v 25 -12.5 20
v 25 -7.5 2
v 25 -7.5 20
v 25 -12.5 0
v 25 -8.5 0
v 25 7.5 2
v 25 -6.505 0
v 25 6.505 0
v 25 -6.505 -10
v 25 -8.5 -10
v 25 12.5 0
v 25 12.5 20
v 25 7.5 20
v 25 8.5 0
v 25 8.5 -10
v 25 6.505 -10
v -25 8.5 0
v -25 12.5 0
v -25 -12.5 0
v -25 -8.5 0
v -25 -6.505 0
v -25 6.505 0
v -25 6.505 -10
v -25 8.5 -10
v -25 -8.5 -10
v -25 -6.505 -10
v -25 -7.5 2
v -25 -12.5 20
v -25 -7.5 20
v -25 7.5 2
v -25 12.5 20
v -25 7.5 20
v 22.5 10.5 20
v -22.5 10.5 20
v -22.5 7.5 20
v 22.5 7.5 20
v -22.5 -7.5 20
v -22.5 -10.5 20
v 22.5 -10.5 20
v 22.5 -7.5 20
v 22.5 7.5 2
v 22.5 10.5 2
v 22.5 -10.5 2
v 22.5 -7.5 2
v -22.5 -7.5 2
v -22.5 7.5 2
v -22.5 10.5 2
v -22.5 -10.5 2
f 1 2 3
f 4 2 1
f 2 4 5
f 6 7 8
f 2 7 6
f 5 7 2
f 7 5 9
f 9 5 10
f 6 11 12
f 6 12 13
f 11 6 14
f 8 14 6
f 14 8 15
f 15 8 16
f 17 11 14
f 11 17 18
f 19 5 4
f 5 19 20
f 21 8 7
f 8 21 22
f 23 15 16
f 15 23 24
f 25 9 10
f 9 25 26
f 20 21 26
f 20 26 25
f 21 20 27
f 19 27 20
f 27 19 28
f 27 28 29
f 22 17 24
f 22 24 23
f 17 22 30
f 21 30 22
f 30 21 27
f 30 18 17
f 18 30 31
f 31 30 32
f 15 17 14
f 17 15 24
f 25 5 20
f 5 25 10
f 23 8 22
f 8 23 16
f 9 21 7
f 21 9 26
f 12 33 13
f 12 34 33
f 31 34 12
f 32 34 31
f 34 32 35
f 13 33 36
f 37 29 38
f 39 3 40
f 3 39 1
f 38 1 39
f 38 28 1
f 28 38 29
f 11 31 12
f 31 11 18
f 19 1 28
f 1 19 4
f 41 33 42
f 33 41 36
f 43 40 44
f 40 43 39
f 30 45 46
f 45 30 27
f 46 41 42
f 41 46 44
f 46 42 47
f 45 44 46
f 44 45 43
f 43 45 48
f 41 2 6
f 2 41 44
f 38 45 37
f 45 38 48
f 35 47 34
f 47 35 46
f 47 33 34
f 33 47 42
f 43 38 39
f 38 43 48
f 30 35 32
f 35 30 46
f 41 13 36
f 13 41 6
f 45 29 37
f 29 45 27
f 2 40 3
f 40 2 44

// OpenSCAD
holerad=2.5;
module pi(){
difference(){
translate([0,0,-5])cube([90,13+4,10],center=true);
translate([0,0,-5])cube([90.01,13.01,10],center=true);
}
difference(){
    translate([0,0,1])cube([90,60,2],center=true);
    translate([20-60,-24.5, 1])cylinder(4, r=holerad,center=true,$fn=50);
    translate([20-60, 24.5, 1])cylinder(4, r=holerad,center=true,$fn=50);
    translate([20-2,-24.5,  1])cylinder(4, r=holerad,center=true,$fn=50);
    translate([20-2, 24.5,  1])cylinder(4, r=holerad,center=true,$fn=50);
}
}


module speaker(){
    
    difference(){
    translate([0,0,-5])cube([50,13+4,10],center=true);
    translate([0,0,-5])cube([50.01,13.01,10],center=true);
    }

    difference(){
        translate([0,0,10])cube([50,25,20],center=true);
        translate([0,0,10+2])cube([45,21,20],center=true);
        translate([0,0,10+2])cube([55,15,20],center=true);
    }
}



module landing(){
    difference(){
    translate([0,0,-5])cube([100,13+4,10],center=true);
    translate([0,0,-5])cube([100.01,13.01,10],center=true);
    }
    difference(){
        translate([0,0,5])cube([100,70,10],center=true);
        translate([0,0,6])cube([96,66,8],center=true);
    }
}




//pi();

speaker();

//landing();
